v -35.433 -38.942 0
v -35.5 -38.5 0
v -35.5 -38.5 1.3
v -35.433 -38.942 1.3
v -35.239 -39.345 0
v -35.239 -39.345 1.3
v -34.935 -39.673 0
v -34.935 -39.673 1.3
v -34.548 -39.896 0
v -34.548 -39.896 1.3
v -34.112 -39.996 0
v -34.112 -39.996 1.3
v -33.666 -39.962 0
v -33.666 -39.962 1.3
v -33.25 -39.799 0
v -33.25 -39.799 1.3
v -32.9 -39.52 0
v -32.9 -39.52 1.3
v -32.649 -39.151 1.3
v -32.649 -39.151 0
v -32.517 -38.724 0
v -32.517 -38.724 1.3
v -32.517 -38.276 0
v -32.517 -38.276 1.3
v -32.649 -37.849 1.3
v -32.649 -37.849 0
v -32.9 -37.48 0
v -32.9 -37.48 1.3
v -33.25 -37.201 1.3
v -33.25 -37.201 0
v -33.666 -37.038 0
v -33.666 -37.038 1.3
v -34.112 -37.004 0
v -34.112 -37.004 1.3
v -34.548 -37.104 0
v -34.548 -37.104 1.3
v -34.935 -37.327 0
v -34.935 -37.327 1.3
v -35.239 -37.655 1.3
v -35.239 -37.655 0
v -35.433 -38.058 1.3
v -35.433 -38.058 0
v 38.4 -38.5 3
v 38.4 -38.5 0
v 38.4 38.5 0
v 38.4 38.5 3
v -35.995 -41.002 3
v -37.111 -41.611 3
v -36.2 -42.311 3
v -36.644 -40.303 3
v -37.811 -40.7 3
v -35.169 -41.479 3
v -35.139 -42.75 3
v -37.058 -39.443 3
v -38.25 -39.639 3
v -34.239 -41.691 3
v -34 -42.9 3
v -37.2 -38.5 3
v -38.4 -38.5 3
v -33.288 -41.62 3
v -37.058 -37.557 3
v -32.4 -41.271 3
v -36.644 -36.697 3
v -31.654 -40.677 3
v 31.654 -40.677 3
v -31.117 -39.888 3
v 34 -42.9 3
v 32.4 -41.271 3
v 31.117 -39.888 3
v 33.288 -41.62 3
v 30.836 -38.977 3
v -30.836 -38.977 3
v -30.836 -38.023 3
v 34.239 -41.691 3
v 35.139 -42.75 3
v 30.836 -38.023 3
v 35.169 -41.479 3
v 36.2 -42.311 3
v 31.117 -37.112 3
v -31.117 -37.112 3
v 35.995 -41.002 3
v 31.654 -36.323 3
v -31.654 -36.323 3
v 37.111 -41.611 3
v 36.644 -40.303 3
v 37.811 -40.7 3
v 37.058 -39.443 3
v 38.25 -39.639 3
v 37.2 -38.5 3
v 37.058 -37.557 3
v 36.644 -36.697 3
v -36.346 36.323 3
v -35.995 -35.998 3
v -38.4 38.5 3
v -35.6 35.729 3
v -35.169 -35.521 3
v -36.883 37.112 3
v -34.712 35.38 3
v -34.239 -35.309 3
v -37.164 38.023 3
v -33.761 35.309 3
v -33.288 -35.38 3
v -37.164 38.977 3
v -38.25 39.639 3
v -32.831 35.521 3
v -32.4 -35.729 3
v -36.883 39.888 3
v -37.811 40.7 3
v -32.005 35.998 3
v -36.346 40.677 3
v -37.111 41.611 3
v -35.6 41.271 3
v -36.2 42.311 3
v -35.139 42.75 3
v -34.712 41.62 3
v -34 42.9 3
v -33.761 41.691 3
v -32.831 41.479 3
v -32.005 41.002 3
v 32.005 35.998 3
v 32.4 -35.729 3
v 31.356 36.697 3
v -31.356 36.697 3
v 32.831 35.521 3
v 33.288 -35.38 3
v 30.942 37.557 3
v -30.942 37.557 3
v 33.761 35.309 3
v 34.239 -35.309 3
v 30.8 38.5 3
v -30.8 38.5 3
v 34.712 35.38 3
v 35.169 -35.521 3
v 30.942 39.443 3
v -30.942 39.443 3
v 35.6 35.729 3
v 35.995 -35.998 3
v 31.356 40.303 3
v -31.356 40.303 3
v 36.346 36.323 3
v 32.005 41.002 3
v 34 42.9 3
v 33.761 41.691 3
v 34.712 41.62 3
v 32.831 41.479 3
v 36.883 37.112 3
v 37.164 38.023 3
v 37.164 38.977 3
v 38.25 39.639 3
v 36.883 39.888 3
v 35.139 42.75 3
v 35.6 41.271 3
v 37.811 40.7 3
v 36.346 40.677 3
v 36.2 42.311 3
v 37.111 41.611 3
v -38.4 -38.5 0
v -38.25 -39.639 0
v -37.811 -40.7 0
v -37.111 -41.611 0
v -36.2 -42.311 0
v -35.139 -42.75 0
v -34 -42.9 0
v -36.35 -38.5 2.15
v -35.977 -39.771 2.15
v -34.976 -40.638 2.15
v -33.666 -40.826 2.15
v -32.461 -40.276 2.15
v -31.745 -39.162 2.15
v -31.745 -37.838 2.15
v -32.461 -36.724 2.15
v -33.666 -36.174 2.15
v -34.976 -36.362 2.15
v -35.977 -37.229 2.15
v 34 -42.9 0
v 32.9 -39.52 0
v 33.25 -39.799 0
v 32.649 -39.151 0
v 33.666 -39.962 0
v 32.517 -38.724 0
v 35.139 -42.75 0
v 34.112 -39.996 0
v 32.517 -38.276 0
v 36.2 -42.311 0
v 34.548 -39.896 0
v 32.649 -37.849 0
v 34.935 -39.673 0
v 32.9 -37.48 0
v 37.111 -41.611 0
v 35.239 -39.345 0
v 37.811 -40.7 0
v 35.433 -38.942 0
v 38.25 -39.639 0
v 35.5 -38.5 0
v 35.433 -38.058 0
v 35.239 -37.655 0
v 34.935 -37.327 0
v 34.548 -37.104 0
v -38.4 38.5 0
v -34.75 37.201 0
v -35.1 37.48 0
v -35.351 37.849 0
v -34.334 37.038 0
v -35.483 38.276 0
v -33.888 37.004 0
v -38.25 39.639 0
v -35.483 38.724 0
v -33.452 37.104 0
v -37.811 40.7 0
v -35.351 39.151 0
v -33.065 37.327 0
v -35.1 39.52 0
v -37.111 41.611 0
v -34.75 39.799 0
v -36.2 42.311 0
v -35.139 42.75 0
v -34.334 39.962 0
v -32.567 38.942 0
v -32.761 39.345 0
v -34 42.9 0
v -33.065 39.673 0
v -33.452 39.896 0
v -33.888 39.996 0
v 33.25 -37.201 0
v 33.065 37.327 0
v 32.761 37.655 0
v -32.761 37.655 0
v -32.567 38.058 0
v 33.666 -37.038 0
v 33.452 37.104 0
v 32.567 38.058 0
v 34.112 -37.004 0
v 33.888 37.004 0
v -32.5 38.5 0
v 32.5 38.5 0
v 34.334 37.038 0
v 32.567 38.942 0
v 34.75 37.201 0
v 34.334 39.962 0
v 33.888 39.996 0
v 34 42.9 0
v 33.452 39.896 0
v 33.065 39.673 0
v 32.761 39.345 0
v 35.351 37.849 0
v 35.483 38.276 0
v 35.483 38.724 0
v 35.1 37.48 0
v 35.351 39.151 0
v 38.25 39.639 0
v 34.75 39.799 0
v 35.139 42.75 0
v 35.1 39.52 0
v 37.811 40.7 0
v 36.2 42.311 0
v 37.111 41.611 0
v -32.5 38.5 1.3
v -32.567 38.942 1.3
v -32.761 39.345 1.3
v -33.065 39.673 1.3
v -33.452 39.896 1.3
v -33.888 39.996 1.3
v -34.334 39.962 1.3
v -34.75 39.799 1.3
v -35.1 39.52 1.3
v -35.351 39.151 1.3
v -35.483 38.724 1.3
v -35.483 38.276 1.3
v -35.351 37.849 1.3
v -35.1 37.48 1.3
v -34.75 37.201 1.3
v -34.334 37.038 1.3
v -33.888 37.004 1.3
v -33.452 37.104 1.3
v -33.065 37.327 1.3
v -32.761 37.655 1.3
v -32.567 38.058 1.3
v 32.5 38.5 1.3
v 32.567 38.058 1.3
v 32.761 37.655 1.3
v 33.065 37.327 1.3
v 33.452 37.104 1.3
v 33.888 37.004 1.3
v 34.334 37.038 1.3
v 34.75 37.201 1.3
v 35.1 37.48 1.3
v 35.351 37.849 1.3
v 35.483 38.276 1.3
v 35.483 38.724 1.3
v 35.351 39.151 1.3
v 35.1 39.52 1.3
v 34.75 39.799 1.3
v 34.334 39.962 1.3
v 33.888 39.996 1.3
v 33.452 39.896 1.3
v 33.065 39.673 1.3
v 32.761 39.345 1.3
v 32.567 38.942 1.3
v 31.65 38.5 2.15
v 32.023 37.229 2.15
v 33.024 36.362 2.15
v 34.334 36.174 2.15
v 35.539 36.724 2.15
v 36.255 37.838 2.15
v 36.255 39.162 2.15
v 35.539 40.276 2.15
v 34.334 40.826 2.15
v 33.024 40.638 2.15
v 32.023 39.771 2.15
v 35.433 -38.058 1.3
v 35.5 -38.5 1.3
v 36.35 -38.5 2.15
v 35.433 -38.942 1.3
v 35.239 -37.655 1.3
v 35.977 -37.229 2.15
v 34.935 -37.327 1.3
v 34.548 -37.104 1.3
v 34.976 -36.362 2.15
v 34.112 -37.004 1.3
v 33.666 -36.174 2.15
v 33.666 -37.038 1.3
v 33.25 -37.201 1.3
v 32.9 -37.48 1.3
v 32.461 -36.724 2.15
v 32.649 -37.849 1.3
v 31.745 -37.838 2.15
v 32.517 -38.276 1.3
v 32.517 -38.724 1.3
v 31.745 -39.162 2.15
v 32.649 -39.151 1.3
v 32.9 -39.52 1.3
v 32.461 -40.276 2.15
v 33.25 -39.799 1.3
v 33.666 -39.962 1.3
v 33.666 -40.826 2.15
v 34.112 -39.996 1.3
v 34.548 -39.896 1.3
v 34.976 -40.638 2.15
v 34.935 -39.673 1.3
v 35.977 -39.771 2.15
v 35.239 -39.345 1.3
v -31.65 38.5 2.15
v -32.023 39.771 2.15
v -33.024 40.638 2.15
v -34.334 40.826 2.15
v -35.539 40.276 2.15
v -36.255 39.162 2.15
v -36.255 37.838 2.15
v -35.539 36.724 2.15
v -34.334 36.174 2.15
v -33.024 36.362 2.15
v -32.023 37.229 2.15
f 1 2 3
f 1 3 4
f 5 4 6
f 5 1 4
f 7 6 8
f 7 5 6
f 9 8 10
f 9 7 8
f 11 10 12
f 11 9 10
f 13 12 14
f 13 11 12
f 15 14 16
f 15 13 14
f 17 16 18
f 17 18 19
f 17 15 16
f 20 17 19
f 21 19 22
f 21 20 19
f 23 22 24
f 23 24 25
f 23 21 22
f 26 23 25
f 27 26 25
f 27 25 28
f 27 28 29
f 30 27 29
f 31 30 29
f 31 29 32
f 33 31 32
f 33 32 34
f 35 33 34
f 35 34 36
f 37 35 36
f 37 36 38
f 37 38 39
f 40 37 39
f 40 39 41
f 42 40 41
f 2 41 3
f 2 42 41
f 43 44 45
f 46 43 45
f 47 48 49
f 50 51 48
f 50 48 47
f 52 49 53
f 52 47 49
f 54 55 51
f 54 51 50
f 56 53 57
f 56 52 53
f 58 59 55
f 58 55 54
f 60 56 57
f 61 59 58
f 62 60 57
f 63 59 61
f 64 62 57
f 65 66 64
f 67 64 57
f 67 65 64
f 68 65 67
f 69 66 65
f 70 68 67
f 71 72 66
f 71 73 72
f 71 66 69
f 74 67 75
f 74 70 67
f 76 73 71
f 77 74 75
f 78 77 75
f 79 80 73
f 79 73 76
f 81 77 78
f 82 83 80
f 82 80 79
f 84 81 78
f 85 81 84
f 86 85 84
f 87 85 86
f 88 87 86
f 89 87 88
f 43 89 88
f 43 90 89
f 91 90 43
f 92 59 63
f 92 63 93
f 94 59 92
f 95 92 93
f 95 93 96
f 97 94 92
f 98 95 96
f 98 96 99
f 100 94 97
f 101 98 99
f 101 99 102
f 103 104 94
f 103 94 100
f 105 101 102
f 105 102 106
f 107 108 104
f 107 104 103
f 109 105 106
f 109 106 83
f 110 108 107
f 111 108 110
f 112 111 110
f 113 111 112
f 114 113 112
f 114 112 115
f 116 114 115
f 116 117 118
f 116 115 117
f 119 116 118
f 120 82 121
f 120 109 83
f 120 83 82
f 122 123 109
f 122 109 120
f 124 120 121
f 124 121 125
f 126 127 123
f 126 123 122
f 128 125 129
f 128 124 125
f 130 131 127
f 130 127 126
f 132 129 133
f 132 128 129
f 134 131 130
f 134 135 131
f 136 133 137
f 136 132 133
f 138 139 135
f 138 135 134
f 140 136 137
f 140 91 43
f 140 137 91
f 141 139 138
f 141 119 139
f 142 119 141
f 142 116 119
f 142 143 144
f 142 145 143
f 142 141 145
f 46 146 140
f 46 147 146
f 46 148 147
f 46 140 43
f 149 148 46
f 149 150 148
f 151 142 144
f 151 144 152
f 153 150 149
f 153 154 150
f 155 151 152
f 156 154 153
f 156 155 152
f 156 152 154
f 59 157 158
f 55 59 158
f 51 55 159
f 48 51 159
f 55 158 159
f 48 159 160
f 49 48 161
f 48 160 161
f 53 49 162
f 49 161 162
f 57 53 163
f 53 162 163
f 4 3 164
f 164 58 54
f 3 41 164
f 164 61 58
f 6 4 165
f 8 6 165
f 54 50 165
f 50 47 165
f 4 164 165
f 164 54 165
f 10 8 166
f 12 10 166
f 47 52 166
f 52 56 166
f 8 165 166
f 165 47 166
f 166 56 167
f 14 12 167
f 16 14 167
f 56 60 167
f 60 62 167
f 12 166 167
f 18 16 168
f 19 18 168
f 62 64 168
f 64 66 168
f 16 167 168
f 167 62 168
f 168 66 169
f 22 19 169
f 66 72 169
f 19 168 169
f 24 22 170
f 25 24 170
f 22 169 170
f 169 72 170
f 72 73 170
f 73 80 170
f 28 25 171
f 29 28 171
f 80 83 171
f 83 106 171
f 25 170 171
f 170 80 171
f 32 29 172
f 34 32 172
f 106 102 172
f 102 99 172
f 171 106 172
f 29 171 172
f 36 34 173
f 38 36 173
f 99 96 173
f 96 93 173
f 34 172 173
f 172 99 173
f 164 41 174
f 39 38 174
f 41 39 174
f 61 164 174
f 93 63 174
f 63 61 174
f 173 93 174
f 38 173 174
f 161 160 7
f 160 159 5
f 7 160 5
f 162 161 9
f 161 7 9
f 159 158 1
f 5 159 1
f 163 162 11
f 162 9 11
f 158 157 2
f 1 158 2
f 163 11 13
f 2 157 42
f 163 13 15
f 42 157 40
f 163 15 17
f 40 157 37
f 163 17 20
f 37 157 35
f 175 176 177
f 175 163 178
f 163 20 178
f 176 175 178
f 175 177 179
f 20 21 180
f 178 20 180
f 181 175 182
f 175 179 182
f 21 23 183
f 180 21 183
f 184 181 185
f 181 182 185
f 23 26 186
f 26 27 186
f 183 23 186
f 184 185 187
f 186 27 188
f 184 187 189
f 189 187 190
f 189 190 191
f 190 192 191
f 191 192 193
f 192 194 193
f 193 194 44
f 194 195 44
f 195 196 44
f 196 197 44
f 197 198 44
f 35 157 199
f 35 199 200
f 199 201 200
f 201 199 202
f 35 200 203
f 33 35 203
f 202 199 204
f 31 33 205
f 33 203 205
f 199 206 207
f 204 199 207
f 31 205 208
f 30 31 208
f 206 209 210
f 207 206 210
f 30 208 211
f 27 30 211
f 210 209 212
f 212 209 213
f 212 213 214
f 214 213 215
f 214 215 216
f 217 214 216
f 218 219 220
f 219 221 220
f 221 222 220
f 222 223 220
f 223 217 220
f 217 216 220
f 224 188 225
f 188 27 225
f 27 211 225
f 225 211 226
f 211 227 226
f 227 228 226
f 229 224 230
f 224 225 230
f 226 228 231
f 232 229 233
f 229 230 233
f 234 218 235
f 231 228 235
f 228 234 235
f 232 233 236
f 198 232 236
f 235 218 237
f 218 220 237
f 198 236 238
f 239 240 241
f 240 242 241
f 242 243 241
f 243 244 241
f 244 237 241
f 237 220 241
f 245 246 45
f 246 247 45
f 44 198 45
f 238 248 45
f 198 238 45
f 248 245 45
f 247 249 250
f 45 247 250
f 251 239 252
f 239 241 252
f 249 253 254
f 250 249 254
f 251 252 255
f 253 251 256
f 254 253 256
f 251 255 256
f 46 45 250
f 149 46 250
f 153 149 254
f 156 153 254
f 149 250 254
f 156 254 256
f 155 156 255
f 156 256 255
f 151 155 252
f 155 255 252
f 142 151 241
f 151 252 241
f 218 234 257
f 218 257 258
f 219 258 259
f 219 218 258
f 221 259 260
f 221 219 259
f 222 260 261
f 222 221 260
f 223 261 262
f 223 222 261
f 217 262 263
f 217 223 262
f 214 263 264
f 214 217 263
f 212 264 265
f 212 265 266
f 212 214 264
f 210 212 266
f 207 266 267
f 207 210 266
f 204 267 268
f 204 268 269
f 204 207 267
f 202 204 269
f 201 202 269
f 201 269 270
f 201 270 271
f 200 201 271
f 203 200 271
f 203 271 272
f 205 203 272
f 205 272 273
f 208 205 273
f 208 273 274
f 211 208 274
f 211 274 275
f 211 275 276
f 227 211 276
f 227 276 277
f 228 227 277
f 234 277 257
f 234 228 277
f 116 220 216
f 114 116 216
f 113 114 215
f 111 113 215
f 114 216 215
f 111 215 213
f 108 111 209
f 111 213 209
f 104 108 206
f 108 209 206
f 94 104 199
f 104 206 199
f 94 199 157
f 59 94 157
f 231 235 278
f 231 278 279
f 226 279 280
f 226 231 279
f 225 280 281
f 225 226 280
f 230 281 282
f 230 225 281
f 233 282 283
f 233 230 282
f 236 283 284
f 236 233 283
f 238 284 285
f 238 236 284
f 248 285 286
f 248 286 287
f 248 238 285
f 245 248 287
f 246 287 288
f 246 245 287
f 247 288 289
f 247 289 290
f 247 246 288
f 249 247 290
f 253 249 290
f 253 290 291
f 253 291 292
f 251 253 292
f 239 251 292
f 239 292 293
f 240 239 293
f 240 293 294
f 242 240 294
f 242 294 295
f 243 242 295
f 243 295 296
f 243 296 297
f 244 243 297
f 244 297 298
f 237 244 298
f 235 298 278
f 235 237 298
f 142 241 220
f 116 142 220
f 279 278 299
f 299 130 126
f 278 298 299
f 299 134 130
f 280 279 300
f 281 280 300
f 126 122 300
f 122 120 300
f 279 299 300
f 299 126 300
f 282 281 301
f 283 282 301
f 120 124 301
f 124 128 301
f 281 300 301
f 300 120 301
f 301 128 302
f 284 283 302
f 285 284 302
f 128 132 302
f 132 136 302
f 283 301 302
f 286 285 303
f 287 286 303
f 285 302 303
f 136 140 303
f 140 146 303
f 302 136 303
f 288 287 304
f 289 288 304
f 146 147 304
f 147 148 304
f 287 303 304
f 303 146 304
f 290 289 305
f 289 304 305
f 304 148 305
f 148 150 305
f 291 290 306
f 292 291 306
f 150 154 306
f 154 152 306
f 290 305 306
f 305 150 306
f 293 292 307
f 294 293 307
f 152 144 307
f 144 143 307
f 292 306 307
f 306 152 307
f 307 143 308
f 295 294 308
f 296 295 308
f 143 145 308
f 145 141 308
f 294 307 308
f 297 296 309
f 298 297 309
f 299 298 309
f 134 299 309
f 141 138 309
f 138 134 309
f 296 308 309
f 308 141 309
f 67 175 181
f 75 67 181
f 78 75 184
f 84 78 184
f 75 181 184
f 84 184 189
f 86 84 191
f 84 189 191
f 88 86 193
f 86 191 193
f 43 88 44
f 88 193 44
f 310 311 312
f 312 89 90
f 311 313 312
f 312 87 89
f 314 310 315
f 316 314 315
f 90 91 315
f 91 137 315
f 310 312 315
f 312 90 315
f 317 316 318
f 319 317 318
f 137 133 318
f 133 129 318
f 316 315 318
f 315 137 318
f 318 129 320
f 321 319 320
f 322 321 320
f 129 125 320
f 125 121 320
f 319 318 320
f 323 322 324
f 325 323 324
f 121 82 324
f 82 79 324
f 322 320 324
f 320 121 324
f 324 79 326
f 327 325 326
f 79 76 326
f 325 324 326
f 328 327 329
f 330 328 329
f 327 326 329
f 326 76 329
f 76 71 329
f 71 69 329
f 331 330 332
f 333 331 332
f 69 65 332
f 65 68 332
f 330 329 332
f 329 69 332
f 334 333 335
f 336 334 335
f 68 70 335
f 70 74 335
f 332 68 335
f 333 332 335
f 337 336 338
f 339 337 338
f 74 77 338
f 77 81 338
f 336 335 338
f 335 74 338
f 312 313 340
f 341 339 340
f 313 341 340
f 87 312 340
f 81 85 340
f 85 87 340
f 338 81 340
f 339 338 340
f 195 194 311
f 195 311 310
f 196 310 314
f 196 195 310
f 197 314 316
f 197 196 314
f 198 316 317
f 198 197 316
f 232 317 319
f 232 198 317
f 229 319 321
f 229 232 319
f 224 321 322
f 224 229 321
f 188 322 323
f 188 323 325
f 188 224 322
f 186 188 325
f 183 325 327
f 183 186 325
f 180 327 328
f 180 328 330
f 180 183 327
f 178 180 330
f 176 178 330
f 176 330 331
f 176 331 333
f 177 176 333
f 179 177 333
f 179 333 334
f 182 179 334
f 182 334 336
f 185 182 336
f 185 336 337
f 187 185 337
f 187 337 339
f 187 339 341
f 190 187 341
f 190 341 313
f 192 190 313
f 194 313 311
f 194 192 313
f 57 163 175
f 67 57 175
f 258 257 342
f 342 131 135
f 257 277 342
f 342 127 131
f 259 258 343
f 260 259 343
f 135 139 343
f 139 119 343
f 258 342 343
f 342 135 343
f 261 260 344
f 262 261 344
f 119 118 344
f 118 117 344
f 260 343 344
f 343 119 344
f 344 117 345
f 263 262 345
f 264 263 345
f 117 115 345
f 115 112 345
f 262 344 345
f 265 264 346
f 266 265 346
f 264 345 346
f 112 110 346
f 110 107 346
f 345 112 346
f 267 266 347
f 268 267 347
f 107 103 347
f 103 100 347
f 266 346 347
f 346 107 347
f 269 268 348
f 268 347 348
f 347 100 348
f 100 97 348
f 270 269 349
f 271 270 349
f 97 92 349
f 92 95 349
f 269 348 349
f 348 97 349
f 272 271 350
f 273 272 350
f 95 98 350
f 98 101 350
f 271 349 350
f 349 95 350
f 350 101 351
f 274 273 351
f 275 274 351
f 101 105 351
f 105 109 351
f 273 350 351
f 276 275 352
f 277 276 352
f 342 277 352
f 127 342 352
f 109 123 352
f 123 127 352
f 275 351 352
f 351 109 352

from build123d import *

# Parameters (mm, degrees)
SKETCH_1_R      = 1.5
EXTRUDE_1_DEPTH = 3
CHAMFER_1_SIZE  = 1.7


with BuildPart() as part:
    # Эскиз1 → Бобышка-Вытянуть1 (new body)
    with BuildSketch(Plane.XY):
        with BuildLine():
            Line((38.4, -38.5), (38.4, 38.5))
            ThreePointArc((38.4, 38.5), (37.111269837, 41.611269837), (34, 42.9))
            Line((34, 42.9), (-34, 42.9))
            ThreePointArc((-34, 42.9), (-37.111269837, 41.611269837), (-38.4, 38.5))
            Line((-38.4, 38.5), (-38.4, -38.5))
            ThreePointArc((-38.4, -38.5), (-37.111269837, -41.611269837), (-34, -42.9))
            Line((-34, -42.9), (34, -42.9))
            ThreePointArc((34, -42.9), (37.111269837, -41.611269837), (38.4, -38.5))
        make_face()
        with Locations((34, -38.5)):
            Circle(SKETCH_1_R, mode=Mode.SUBTRACT)
        with Locations(Location((-34, -38.5, 0), (0, 0, 180))):
            Circle(SKETCH_1_R, mode=Mode.SUBTRACT)
        with Locations(Location((34, 38.5, 0), (0, 0, 180))):
            Circle(SKETCH_1_R, mode=Mode.SUBTRACT)
        with Locations((-34, 38.5)):
            Circle(SKETCH_1_R, mode=Mode.SUBTRACT)
    extrude(amount=EXTRUDE_1_DEPTH)

    # Фаска1
    chamfer_1_edges = [part.edges().sort_by_distance(p)[0] for p in [
        (32.5, -38.5, 3),
        (-32.5, -38.5, 3),
        (35.5, 38.5, 3),
        (-35.5, 38.5, 3),
    ]]
    chamfer(chamfer_1_edges, length=CHAMFER_1_SIZE)


solid = part.part
